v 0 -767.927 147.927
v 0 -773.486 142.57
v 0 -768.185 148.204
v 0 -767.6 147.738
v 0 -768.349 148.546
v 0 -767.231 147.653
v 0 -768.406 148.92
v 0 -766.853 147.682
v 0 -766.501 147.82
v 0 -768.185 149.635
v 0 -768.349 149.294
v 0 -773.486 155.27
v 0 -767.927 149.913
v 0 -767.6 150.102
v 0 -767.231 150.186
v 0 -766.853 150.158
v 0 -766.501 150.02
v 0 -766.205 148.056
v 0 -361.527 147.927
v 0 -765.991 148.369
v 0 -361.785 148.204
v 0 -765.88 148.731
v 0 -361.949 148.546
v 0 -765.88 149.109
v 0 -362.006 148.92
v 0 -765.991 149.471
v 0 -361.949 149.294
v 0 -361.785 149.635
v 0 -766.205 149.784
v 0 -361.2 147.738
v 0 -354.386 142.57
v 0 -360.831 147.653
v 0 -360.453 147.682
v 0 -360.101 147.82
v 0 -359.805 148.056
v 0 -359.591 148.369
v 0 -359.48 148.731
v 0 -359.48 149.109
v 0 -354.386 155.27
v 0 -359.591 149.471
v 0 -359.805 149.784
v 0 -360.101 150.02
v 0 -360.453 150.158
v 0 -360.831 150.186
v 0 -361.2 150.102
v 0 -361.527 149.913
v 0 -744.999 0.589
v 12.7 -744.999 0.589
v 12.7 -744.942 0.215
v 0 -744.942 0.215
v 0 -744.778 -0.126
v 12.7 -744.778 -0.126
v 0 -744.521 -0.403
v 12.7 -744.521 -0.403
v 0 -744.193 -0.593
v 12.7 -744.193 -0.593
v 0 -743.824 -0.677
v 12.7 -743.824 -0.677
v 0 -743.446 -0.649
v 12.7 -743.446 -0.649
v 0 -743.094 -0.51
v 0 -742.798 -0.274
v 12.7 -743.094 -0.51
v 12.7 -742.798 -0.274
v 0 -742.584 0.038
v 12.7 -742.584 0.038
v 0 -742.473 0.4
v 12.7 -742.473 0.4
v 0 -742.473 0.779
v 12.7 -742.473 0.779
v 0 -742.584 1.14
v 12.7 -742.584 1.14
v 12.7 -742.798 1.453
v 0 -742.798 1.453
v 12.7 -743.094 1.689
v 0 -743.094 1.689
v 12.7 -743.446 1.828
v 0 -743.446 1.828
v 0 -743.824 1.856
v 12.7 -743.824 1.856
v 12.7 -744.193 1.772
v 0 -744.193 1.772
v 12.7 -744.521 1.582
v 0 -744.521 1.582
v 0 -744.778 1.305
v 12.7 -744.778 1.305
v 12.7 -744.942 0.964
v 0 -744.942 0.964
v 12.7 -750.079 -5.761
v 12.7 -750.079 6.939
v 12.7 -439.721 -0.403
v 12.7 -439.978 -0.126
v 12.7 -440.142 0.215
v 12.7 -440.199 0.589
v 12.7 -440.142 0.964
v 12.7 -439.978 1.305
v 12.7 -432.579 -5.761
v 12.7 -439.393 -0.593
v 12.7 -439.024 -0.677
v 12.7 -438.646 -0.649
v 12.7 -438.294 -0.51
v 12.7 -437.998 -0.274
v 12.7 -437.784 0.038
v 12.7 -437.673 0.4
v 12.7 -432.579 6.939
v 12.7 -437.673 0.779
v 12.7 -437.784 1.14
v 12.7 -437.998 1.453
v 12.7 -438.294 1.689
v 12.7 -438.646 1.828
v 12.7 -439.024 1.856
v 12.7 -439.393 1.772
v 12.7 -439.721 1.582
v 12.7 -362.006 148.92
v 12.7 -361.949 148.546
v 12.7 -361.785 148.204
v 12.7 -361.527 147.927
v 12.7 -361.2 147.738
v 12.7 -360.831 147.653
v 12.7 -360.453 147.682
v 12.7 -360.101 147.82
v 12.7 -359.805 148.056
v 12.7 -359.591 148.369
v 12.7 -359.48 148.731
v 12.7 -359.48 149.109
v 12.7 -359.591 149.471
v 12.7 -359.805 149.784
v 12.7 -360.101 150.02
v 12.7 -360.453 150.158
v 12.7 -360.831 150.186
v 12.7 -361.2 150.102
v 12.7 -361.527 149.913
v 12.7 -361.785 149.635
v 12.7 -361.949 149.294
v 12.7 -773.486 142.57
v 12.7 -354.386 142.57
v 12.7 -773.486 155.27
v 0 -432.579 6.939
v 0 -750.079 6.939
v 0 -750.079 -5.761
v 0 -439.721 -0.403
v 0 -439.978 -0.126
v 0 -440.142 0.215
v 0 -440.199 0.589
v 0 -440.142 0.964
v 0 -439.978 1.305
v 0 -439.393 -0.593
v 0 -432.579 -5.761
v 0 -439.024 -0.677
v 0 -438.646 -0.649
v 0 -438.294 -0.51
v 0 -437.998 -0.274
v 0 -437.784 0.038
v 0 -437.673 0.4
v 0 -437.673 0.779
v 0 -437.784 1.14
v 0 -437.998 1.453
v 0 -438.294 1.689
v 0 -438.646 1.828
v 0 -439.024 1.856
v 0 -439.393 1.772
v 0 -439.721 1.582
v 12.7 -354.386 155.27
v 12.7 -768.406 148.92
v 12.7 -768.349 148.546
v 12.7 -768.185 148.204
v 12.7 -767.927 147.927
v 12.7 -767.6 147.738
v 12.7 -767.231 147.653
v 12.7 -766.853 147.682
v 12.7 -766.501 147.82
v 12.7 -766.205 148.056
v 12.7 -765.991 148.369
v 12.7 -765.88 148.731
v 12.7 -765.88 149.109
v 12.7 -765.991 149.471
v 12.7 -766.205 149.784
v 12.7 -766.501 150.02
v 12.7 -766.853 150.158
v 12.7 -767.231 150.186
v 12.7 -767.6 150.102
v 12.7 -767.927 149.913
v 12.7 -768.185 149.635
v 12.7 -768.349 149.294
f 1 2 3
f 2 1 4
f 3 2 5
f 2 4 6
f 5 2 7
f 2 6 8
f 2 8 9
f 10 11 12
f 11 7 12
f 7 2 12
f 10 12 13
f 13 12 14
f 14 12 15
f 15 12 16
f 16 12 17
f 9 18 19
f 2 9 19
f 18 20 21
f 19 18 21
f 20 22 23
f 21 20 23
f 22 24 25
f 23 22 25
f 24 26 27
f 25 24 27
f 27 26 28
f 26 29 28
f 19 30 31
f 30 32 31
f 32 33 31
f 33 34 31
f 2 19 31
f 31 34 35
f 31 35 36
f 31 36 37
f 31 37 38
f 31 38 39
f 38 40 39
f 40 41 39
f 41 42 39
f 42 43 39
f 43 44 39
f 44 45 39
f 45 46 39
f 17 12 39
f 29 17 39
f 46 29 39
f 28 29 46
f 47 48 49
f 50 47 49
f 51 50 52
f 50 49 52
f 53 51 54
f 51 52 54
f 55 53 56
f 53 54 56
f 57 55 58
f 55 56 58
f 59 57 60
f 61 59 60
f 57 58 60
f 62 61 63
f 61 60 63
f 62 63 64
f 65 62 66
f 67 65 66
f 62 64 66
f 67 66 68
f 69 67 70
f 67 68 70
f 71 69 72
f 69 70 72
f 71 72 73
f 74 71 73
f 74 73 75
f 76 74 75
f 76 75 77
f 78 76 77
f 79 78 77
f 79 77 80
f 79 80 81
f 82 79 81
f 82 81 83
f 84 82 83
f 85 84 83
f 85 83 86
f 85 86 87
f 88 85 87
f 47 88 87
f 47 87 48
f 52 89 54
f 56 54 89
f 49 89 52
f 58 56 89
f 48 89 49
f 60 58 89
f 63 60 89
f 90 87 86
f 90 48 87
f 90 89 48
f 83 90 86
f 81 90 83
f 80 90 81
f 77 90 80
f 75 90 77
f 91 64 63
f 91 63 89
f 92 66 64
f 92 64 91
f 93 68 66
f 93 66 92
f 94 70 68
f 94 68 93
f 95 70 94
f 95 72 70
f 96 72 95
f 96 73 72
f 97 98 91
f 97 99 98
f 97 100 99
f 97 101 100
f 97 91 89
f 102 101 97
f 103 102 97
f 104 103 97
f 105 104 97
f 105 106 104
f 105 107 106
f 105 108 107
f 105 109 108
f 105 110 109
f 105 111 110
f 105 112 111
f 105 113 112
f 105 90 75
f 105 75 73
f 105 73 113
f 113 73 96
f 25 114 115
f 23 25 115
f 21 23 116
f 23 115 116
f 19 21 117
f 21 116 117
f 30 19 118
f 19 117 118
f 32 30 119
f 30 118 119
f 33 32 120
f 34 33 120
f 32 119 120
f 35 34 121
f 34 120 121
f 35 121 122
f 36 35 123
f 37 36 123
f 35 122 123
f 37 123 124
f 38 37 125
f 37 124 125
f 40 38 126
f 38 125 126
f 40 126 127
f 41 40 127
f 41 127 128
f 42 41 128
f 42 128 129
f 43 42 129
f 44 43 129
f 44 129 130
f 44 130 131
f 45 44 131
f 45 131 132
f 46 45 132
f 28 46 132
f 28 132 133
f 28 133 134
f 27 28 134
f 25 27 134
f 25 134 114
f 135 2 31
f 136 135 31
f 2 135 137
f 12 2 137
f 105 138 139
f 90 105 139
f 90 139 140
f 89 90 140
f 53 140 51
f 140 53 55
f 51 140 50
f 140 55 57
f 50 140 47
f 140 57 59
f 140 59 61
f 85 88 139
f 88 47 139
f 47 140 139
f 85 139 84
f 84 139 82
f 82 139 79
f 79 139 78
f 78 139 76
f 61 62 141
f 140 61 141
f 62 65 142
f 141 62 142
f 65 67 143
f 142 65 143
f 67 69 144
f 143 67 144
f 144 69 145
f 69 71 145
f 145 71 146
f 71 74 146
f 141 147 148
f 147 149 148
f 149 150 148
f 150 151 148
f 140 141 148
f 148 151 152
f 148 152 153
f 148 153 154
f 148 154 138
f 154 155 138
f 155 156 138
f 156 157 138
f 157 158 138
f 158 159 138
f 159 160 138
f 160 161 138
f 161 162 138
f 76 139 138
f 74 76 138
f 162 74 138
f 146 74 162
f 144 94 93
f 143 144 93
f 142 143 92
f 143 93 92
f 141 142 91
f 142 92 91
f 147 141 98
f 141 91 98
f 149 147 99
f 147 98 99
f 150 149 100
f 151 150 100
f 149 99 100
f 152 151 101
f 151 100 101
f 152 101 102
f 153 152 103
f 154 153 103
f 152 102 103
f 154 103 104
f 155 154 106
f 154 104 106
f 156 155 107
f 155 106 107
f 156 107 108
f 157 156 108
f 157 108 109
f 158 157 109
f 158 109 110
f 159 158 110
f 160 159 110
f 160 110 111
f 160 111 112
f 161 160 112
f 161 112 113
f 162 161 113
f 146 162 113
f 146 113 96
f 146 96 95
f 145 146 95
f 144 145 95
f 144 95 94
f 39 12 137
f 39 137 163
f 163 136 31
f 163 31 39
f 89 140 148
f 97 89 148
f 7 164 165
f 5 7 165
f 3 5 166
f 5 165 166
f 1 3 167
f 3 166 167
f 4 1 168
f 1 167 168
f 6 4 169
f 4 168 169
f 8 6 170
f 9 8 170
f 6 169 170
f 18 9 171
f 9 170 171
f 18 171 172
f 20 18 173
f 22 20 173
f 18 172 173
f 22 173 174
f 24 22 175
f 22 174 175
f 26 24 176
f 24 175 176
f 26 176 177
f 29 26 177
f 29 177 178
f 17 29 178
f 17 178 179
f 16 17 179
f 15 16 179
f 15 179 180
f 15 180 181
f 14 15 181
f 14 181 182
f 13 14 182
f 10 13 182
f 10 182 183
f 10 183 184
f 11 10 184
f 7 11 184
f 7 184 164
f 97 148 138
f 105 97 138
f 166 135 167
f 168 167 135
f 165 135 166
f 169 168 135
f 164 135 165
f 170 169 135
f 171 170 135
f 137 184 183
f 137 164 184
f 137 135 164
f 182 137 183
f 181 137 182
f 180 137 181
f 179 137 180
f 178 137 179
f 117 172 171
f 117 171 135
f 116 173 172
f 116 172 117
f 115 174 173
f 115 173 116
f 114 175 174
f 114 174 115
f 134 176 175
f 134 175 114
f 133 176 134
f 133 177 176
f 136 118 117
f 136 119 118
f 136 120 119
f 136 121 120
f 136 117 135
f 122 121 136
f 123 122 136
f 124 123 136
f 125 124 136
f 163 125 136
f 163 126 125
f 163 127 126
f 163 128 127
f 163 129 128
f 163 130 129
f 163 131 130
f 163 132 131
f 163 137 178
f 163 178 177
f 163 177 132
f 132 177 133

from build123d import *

# Parameters (mm, degrees)
F0_W     = 419.1
F0_H     = 12.7
F1_DEPTH = 12.7
F0_W_2   = 292.1
F2_D     = 2.54
F3_D     = 2.54
F4_D     = 2.54


with BuildPart() as f1:
    # F0 (on Right) → F1 (new body)
    with BuildSketch(Plane.YZ):
        with Locations((-563.935660553, 148.9198846579)):
            Rectangle(F0_W, F0_H)
    extrude(amount=F1_DEPTH)

    # F2 (through all)
    with Locations(Plane(origin=(0, 0, 0), x_dir=(0, 1, 0), z_dir=(-1, 0, 0))):
        with Locations((-360.735660553, -148.9198846579)):
            Hole(F2_D / 2)

    # F3 (through all)
    with Locations(Plane(origin=(0, 0, 0), x_dir=(0, 1, 0), z_dir=(-1, 0, 0))):
        with Locations((-767.135660553, -148.9198846579)):
            Hole(F3_D / 2)


with BuildPart() as f1b:
    # F0 (on Right) → F1, piece 2 (new body)
    with BuildSketch(Plane.YZ):
        Polygon((-743.7286781311, 0.5894386373), (-750.0786781311, 6.9394386373), (-750.0786781311, -5.7605613627), align=None)
        Polygon((-737.3786781311, 6.9394386373), (-750.0786781311, 6.9394386373), (-743.7286781311, 0.5894386373), align=None)
        with Locations((-591.3286781311, 0.5894386373)):
            Rectangle(F0_W_2, F0_H)
        Polygon((-737.3786781311, -5.7605613627), (-737.3786781311, 6.9394386373), (-743.7286781311, 0.5894386373), align=None)
        Polygon((-743.7286781311, 0.5894386373), (-750.0786781311, -5.7605613627), (-737.3786781311, -5.7605613627), align=None)
        Polygon((-438.9286781311, 0.5894386373), (-445.2786781311, 6.9394386373), (-445.2786781311, -5.7605613627), align=None)
        Polygon((-432.5786781311, 6.9394386373), (-445.2786781311, 6.9394386373), (-438.9286781311, 0.5894386373), align=None)
        Polygon((-432.5786781311, -5.7605613627), (-432.5786781311, 6.9394386373), (-438.9286781311, 0.5894386373), align=None)
        Polygon((-438.9286781311, 0.5894386373), (-445.2786781311, -5.7605613627), (-432.5786781311, -5.7605613627), align=None)
    extrude(amount=F1_DEPTH)

    # F4 (through all)
    with Locations(Plane(origin=(0, 0, 0), x_dir=(0, 1, 0), z_dir=(-1, 0, 0))):
        with Locations((-743.7286781311, -0.5894386373), (-438.9286781311, -0.5894386373)):
            Hole(F4_D / 2)


solid = Compound([f1.part, f1b.part])
